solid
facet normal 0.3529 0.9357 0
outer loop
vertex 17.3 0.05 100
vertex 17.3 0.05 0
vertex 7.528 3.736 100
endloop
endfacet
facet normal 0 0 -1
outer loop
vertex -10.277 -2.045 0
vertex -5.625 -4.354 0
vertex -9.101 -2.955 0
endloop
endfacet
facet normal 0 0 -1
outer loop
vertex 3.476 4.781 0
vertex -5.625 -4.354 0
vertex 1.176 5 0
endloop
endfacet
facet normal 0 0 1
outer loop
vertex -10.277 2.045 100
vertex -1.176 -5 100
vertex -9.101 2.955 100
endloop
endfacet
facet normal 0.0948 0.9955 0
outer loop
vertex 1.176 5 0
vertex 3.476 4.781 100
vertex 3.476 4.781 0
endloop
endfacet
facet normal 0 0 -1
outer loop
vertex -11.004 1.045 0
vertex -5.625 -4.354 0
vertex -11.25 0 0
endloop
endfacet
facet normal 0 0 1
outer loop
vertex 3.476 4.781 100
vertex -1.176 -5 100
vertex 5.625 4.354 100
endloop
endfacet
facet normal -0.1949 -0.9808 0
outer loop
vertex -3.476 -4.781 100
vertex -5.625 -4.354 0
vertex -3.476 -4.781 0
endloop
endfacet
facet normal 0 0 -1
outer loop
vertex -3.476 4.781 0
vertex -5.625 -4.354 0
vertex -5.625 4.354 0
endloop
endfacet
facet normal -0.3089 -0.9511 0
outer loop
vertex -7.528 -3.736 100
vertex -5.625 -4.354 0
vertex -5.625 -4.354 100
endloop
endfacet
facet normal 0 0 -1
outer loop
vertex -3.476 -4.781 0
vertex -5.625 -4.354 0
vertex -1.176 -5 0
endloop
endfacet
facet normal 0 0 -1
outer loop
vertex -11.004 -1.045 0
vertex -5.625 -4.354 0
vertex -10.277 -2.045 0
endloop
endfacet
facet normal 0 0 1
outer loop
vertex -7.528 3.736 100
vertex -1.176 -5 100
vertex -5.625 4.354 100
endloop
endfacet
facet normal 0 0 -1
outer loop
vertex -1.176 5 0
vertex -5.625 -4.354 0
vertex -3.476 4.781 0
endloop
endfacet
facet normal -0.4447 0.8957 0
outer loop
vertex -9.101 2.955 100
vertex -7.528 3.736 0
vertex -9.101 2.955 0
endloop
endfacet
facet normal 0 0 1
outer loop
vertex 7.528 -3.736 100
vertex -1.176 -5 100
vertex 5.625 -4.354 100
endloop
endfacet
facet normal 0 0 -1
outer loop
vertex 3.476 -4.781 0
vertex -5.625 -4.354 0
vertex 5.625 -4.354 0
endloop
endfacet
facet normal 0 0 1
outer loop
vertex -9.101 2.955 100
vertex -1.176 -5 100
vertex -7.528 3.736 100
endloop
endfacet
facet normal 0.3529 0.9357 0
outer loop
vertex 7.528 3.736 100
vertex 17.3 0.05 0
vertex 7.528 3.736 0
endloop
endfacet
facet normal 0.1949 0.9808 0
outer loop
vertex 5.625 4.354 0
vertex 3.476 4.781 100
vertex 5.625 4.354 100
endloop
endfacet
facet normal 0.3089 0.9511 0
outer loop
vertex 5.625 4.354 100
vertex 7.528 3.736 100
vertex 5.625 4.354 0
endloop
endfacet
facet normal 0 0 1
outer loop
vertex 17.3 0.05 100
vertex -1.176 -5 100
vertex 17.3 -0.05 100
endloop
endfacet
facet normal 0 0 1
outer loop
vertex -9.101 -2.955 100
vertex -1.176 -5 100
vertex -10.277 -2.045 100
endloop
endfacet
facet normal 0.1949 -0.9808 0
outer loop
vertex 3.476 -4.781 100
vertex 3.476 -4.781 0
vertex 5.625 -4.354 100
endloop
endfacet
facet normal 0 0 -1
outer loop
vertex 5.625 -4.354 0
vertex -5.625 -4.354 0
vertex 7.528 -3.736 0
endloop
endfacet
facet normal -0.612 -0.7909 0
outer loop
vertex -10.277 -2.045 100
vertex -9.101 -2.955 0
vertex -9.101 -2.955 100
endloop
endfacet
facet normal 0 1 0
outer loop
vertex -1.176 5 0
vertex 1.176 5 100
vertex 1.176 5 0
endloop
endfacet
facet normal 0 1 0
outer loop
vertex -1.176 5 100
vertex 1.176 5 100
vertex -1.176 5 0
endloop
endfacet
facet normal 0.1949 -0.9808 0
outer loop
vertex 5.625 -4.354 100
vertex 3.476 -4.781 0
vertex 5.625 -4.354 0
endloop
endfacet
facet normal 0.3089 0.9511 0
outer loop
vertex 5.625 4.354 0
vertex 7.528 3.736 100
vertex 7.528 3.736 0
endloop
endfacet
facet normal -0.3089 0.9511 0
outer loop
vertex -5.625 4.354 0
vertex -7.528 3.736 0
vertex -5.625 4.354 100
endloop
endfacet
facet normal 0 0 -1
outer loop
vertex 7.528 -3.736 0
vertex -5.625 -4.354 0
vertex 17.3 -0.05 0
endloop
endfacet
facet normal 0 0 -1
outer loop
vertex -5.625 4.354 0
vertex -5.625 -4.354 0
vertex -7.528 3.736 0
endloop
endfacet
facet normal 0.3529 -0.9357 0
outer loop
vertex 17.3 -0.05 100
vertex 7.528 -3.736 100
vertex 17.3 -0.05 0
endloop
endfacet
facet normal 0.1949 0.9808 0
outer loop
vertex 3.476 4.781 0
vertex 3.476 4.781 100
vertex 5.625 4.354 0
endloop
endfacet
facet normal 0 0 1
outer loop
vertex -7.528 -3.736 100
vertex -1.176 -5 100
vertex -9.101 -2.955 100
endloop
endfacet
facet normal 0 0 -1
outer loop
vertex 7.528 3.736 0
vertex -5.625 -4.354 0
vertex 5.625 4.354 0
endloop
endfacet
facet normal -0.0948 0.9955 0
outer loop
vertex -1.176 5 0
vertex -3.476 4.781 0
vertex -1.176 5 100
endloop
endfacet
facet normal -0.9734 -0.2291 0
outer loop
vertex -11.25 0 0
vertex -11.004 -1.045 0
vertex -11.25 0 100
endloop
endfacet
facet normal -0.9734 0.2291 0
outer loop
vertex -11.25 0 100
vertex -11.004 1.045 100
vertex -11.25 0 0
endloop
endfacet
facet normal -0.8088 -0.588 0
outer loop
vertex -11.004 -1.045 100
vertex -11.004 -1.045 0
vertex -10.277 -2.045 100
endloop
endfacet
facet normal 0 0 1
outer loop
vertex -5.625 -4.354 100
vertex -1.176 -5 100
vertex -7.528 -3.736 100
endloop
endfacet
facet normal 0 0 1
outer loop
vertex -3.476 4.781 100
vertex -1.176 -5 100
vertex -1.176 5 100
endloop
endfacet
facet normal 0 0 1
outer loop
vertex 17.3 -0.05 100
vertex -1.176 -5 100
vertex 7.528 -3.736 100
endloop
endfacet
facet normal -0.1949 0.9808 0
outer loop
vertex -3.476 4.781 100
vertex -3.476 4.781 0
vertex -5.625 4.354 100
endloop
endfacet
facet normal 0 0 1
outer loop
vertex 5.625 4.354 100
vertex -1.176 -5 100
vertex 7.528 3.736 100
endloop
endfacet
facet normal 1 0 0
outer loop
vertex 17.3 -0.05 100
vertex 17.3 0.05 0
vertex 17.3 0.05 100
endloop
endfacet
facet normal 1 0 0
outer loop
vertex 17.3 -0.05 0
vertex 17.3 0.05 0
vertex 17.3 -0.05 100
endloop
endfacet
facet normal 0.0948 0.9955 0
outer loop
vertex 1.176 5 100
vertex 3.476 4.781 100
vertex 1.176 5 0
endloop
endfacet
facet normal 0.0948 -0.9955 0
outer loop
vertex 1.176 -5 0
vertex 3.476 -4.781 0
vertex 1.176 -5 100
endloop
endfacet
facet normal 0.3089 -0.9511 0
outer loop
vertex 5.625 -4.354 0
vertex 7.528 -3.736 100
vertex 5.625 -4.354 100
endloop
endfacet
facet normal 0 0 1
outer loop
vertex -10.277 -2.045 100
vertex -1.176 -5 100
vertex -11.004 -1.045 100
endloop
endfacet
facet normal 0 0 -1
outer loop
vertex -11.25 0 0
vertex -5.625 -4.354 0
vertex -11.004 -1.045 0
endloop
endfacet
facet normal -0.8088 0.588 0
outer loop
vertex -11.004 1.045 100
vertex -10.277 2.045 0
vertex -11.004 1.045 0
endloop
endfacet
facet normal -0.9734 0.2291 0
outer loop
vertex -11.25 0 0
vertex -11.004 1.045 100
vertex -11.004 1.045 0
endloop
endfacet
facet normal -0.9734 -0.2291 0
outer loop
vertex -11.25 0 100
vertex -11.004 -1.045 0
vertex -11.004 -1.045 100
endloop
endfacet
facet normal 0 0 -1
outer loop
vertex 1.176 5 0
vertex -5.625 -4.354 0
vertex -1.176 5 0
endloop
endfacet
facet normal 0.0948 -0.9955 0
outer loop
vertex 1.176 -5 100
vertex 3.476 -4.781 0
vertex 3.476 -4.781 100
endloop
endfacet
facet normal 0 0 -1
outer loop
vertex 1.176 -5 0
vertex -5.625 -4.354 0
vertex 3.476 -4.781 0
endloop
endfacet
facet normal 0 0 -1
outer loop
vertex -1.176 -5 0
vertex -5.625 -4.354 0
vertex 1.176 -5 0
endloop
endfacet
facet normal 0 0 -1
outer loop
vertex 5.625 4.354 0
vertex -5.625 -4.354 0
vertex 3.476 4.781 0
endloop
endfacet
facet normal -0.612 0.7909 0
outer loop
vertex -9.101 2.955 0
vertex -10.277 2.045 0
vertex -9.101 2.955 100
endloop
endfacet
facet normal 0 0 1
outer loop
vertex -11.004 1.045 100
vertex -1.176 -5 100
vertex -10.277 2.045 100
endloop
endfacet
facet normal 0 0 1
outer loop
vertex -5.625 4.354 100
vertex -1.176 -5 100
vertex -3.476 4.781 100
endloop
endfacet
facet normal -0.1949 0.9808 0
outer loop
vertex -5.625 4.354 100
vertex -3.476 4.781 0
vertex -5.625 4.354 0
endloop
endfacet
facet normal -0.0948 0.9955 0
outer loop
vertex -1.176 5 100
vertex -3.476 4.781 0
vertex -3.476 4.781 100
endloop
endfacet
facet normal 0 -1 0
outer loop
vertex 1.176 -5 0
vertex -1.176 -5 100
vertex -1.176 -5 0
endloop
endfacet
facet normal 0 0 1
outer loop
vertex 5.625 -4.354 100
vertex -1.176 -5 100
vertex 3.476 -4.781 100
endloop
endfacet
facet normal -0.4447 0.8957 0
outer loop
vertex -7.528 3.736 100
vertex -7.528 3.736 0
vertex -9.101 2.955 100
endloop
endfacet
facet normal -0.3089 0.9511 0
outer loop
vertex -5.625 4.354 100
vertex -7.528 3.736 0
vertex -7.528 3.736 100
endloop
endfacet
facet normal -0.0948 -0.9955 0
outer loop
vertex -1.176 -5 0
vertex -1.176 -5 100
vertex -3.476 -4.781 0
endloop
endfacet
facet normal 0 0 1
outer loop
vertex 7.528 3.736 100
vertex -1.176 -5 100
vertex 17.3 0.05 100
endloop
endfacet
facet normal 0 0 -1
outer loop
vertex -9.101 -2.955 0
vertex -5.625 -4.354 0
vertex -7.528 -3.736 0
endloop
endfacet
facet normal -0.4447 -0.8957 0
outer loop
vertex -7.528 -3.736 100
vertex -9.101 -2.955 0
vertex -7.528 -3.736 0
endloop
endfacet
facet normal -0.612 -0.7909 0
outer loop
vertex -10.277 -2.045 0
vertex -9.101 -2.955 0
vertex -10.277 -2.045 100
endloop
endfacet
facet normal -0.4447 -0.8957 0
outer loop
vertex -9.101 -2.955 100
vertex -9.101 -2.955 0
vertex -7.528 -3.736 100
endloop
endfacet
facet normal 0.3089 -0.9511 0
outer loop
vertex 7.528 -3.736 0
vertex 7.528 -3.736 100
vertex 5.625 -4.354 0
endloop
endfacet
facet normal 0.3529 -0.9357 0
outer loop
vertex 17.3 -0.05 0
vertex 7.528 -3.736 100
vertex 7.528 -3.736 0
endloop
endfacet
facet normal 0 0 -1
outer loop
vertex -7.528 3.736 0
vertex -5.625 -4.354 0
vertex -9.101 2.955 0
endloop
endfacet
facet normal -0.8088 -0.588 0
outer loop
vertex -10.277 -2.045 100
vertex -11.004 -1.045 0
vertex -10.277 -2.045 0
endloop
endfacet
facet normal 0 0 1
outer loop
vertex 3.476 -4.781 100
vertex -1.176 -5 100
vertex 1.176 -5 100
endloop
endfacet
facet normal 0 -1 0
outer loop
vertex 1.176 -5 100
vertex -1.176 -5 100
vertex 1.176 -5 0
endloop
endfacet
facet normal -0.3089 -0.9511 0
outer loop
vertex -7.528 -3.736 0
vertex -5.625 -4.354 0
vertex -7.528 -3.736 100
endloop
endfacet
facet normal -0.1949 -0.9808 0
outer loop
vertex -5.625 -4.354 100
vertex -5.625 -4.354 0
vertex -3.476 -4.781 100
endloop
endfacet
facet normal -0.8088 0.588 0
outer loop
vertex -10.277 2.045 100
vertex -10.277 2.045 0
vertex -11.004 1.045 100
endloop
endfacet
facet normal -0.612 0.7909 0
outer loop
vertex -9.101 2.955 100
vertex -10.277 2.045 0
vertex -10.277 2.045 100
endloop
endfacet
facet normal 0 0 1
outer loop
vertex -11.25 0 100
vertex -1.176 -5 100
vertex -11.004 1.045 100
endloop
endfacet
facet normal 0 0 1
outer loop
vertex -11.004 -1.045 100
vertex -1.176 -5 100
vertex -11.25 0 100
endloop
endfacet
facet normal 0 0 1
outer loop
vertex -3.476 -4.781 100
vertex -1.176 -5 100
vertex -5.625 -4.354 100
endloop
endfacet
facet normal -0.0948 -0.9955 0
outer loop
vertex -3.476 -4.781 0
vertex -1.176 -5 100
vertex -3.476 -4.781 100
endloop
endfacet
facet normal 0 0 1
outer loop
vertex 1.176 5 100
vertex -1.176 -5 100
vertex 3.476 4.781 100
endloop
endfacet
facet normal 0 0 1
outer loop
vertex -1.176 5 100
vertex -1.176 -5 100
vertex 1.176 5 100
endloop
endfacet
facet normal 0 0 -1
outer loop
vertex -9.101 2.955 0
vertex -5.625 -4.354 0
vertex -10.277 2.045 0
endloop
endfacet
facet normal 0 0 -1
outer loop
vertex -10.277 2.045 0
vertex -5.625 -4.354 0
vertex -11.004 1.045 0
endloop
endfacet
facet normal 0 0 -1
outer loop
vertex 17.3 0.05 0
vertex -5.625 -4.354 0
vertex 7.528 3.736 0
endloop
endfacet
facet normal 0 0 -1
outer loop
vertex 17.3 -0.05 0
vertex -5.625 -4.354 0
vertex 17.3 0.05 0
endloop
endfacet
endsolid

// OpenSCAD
module wing(chord, thickness, span) {
hull() {
    resize([.75*chord, thickness, span]) cylinder(span, thickness, thickness);
    translate([.575*chord, 0, span/2]) cube([.1, .1, span], true);
};
}

wing(30, 10, 100);
